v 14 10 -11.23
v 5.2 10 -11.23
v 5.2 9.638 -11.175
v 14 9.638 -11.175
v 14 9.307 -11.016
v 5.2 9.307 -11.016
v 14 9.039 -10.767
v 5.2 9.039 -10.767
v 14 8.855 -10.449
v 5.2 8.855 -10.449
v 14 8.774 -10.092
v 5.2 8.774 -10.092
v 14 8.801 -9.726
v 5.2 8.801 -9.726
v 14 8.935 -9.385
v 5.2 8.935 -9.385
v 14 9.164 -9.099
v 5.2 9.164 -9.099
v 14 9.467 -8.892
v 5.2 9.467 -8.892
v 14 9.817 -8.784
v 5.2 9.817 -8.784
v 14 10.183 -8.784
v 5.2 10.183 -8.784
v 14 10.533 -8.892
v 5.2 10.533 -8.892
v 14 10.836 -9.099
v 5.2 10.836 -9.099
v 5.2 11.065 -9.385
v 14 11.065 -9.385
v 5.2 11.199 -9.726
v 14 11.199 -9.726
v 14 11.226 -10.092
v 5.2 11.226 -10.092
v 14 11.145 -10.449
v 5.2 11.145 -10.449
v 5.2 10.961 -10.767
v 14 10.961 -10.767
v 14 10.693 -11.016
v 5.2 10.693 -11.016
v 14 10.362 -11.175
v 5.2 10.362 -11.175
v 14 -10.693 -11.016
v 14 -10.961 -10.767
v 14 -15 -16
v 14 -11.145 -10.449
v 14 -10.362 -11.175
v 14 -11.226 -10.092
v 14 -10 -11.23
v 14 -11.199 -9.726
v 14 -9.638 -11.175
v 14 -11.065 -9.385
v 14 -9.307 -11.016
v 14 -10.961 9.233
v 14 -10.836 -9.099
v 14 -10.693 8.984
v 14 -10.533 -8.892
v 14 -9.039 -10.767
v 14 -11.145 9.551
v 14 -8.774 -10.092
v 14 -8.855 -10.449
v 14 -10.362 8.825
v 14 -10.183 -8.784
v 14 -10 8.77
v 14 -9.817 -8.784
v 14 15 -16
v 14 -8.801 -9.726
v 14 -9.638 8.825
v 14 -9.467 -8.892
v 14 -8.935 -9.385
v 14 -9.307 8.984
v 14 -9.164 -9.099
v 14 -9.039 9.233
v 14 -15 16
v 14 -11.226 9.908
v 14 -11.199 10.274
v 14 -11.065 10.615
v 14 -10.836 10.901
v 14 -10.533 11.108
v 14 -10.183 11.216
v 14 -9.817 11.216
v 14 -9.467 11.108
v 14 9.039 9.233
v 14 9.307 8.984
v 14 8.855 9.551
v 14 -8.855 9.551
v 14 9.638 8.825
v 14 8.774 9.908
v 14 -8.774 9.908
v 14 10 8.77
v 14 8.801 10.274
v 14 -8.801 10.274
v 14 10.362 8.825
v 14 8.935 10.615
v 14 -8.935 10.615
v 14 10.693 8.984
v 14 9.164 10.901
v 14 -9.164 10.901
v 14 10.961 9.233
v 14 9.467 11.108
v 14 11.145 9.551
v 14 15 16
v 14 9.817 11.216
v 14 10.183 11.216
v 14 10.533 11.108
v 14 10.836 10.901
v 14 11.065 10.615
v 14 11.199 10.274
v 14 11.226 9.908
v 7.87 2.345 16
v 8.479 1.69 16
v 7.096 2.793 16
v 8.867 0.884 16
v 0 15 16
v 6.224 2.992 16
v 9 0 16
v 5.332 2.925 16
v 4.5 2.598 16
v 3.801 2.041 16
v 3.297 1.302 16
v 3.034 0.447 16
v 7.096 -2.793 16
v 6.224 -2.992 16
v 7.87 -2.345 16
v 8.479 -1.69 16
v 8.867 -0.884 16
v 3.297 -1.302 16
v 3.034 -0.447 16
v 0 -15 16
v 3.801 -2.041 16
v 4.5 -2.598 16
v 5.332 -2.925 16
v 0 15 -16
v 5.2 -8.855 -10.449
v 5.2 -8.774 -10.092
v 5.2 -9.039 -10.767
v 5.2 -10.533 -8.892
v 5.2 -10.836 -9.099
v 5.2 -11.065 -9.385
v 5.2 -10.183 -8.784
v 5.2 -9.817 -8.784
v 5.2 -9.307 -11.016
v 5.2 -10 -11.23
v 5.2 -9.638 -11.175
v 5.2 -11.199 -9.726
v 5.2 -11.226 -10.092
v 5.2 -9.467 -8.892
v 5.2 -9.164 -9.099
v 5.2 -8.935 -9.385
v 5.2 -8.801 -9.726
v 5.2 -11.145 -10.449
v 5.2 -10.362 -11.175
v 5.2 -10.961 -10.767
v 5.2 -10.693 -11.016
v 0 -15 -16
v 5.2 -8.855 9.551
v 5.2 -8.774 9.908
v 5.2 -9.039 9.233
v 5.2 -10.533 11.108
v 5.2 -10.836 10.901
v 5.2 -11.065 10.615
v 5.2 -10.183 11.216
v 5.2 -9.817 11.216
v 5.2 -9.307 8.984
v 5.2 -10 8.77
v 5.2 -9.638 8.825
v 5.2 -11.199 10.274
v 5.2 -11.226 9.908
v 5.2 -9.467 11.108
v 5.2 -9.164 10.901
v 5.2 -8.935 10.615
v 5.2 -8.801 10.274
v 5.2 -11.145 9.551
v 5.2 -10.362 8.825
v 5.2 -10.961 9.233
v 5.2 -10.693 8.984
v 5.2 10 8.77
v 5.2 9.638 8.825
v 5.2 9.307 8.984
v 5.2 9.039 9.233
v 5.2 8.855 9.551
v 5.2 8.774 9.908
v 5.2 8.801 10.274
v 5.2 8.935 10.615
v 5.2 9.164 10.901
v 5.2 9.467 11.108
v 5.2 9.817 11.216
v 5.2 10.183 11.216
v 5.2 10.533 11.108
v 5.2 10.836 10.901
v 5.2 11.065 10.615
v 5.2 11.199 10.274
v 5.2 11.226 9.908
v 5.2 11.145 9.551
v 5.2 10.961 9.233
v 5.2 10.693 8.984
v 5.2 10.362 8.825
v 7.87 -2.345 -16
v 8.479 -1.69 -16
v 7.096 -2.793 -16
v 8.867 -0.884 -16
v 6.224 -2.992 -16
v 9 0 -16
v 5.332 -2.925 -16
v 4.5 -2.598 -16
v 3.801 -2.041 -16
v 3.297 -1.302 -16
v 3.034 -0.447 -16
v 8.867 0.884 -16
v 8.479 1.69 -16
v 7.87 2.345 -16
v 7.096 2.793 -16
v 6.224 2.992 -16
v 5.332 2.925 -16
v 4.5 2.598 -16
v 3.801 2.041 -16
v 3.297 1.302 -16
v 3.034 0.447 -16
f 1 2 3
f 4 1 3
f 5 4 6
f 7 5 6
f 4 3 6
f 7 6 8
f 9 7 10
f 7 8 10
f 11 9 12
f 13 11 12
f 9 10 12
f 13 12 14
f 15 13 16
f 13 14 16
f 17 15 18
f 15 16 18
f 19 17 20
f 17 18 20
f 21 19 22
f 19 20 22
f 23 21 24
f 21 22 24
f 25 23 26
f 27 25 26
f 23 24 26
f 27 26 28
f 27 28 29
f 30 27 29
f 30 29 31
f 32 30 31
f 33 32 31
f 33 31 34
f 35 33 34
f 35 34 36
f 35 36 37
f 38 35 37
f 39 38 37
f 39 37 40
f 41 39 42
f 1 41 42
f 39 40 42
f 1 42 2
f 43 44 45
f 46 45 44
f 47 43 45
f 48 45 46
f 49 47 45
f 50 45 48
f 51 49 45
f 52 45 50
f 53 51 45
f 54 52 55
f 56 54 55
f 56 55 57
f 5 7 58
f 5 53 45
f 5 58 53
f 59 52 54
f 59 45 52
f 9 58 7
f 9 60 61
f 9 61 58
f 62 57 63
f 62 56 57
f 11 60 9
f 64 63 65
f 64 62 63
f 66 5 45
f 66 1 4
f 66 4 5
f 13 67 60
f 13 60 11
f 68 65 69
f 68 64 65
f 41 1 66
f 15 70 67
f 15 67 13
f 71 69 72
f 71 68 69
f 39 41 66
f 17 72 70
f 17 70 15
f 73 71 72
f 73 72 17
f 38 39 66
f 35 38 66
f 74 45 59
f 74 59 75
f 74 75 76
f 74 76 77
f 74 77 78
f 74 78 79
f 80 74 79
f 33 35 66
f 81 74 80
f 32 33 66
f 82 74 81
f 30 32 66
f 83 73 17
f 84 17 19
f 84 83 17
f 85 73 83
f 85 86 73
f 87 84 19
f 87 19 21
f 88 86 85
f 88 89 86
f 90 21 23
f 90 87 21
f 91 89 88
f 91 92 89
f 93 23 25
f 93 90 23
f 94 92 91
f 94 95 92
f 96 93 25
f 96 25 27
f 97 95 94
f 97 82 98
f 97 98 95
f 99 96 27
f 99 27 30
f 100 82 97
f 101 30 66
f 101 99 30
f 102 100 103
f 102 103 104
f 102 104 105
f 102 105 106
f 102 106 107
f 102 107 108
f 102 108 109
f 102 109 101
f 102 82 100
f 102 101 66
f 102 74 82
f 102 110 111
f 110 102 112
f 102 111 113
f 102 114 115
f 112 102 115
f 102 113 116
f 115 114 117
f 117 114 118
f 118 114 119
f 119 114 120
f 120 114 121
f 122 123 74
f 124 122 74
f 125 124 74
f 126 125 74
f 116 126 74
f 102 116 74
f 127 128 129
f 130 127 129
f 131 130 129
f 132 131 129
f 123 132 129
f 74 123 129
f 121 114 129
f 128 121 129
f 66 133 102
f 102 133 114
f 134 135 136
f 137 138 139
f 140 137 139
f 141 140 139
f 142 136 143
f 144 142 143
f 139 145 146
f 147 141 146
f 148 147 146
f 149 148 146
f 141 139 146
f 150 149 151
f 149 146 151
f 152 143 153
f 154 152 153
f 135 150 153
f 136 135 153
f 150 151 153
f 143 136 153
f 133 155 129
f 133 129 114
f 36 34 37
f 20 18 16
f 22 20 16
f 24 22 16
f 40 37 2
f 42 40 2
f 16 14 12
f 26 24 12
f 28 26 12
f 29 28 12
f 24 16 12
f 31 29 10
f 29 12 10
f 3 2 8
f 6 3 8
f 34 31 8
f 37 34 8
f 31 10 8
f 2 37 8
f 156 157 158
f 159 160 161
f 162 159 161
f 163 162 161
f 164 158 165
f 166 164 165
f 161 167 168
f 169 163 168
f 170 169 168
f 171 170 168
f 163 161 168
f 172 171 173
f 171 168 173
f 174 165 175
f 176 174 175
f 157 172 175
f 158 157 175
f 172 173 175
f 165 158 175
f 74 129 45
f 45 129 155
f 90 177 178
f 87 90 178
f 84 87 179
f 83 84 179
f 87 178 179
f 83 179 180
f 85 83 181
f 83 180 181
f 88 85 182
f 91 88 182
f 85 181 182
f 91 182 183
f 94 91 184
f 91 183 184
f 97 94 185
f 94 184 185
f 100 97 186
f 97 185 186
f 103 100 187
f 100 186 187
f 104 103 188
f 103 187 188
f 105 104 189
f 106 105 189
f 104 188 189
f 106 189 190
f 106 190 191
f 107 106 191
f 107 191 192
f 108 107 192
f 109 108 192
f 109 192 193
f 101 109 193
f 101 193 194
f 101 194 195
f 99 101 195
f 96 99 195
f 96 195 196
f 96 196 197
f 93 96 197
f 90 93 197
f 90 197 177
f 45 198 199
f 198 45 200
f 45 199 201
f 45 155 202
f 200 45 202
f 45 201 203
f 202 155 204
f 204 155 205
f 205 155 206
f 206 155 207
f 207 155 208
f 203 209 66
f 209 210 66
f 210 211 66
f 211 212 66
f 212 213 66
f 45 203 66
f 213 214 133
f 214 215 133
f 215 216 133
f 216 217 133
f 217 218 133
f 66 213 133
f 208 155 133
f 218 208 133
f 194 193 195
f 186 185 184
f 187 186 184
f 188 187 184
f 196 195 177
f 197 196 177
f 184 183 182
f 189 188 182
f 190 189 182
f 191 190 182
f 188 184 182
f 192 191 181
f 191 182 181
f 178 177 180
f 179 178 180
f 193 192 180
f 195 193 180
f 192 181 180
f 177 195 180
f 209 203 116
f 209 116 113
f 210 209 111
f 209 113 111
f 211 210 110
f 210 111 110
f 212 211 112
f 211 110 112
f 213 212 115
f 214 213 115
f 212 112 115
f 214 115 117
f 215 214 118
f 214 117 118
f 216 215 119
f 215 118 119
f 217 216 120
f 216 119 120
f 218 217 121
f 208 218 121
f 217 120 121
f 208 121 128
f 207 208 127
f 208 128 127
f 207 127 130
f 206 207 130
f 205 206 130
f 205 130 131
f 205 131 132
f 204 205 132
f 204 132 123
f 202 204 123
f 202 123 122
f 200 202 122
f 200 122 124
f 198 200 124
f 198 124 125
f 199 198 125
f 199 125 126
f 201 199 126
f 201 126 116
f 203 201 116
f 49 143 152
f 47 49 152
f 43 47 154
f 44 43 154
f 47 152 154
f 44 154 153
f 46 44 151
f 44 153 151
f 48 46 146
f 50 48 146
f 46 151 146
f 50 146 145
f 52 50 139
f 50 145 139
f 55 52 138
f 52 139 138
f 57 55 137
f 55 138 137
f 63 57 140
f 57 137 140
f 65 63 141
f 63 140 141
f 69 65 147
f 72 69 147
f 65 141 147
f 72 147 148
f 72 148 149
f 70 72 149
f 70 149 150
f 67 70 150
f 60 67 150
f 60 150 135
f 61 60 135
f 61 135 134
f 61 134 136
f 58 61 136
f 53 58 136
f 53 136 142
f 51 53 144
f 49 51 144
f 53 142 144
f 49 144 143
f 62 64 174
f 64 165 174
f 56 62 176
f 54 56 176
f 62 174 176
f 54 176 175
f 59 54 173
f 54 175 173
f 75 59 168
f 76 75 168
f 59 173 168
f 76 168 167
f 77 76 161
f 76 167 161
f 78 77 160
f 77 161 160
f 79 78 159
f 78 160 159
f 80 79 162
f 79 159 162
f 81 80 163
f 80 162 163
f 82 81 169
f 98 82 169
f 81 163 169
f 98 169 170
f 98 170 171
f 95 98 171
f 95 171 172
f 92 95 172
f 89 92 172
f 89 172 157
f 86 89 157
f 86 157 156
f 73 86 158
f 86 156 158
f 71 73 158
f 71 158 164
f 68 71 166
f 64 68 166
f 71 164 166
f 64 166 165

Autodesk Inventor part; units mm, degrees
ref_plane "YZ Plane" through (0, 0, 0) normal (1, 0, 0) x (0, 1, 0)
ref_plane "XZ Plane" through (0, 0, 0) normal (0, 1, 0) x (-1, 0, 0)
ref_plane "XY Plane" through (0, 0, 0) normal (0, 0, 1) x (1, 0, 0)
sketch "スケッチ1" plane through (0, 0, 0) normal (1, 0, 0) x (0, 1, 0)
  line L0 (-15, -16) -> (15, -16)
  line L1 (15, -16) -> (15, 16)
  line L2 (15, 16) -> (-15, 16)
  line L3 (-15, 16) -> (-15, -16)
  line L4 (-15, -16) -> (15, 16) construction
  line L5 (15, -16) -> (-15, 16) construction
  point P0 (0, 0)
  dimension "d0" = 32
  dimension "d1" = 30
extrude "押し出し1" add sketch "スケッチ1" along normal blind 14
sketch "スケッチ2" plane through (0, -15, 16) normal (0, 0, 1) x (1, 0, 0)
  line L0 (0, 30) -> (0, 0) projected
  line L1 (0, 0) -> (14, 0) projected
  line L2 (14, 30) -> (14, 0) projected
  line L3 (0, 30) -> (14, 30) projected
  circle A0 centre (6, 15) radius 3
  point P0 (0, 15)
  dimension "d4" = 6
  dimension "d17" = 6
extrude "押し出し2" cut sketch "スケッチ2" against normal through all contours A0
sketch "スケッチ3" plane through (14, 0, 0) normal (1, 0, 0) x (0, 0, -1)
  line L0 (-10, 10) -> (10, 10)
  line L1 (10, 10) -> (10, -10)
  line L2 (10, -10) -> (-10, -10)
  line L3 (-10, -10) -> (-10, 10)
  line L4 (-10, 10) -> (10, -10) construction
  line L5 (10, 10) -> (-10, -10) construction
  line L6 (-16, 15) -> (-16, -15) projected
  point P0 (0, 0)
  point P1 (0, 0)
  dimension "d7" = 20
  dimension "d8" = 20
  dimension "d9" = 6
hole "穴1" at (14, 10, -10) at (14, 10, 10) at (14, -10, 10) at (14, -10, -10) direction (-1, 0, 0) diameter 2.459 depth 8.8 thread size "M3x0.5" class "6H" standard "ISO Metric profile"
properties part number "Linear_Unit_B"
